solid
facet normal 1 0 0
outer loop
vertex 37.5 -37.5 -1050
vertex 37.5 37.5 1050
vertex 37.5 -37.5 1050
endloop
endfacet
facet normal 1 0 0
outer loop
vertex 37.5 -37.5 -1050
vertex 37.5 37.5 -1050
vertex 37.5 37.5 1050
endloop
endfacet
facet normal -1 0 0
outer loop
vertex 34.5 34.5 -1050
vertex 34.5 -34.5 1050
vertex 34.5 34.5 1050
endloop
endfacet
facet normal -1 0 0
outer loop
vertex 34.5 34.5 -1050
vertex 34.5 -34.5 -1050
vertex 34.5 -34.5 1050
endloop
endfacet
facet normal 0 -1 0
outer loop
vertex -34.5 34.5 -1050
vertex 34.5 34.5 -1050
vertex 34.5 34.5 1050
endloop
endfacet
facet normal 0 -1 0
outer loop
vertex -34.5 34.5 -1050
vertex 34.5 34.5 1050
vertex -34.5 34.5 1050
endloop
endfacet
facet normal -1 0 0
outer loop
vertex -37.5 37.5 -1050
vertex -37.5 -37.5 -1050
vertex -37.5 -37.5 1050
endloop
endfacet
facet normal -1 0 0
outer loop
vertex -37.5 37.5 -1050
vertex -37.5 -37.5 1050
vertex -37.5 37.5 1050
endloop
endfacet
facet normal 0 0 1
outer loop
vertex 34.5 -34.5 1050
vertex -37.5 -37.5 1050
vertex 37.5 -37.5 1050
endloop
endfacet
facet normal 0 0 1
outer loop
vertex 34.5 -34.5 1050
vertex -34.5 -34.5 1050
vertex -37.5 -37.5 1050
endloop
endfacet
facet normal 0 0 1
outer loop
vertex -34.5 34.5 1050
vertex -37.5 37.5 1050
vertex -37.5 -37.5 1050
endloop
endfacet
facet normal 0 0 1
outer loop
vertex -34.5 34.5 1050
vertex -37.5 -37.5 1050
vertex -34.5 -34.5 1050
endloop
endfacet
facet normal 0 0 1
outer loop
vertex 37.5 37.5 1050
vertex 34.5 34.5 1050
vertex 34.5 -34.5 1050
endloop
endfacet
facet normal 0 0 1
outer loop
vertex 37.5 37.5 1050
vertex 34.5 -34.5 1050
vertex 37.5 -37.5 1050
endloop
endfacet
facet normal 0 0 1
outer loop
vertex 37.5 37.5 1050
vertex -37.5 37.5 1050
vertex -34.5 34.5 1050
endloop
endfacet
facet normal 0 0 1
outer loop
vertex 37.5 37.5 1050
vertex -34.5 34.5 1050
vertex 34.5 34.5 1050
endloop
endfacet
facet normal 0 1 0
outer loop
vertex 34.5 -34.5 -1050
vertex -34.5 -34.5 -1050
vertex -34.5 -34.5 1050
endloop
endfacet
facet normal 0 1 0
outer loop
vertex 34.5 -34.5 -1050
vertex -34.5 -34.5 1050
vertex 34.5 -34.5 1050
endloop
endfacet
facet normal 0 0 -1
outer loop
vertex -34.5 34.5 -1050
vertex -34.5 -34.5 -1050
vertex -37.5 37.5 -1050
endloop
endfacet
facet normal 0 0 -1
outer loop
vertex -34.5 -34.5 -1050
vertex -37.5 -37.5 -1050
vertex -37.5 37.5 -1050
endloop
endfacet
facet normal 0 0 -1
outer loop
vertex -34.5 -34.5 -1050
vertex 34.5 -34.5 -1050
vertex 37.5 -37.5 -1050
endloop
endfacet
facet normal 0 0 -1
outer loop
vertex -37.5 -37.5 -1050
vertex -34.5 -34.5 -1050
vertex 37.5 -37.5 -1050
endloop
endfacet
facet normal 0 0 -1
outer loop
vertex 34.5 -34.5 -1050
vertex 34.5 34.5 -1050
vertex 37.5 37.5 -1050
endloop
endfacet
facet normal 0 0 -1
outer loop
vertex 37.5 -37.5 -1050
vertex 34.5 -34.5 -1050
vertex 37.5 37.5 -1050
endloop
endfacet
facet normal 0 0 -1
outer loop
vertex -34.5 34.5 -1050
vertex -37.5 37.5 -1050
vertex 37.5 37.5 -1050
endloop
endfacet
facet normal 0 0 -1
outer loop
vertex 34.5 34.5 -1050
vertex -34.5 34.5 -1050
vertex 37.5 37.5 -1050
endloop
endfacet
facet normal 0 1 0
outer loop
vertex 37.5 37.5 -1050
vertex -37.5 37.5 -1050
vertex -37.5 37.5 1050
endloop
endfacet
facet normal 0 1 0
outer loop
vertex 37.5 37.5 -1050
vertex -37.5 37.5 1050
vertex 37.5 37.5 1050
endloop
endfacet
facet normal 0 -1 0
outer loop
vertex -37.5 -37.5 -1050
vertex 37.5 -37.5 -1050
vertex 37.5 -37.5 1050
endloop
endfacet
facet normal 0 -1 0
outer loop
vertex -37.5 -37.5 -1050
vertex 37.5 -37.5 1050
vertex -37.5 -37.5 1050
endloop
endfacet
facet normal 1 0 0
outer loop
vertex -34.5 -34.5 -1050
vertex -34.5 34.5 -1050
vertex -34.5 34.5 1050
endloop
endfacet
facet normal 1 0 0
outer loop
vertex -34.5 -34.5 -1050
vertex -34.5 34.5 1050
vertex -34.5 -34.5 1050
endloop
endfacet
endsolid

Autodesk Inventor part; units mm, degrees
ref_plane "YZ Plane" through (0, 0, 0) normal (1, 0, 0) x (0, 1, 0)
ref_plane "XZ Plane" through (0, 0, 0) normal (0, 1, 0) x (-1, 0, 0)
ref_plane "XY Plane" through (0, 0, 0) normal (0, 0, 1) x (1, 0, 0)
sketch "Boceto1" plane through (0, 0, 0) normal (0, 0, 1) x (1, 0, 0)
  line L0 (-37.5, 37.5) -> (37.5, 37.5)
  line L1 (37.5, 37.5) -> (37.5, -37.5)
  line L2 (37.5, -37.5) -> (-37.5, -37.5)
  line L3 (-37.5, -37.5) -> (-37.5, 37.5)
  line L4 (34.5, 34.5) -> (-34.5, 34.5)
  line L5 (-34.5, 34.5) -> (-34.5, -34.5)
  line L6 (-34.5, -34.5) -> (34.5, -34.5)
  line L7 (34.5, -34.5) -> (34.5, 34.5)
  point P0 (0, 0)
  dimension "d0" = 75
  dimension "d1" = 75
  dimension "d2" = 3
  dimension "d3" = 37.5
  dimension "d4" = 37.5
extrude "Extrusión1" add sketch "Boceto1" along normal mid plane 2100
equation "\"d0\" = width"
equation "\"d1\" = height"
equation "\"d2\" = t"
equation "\"d3\" = 0.5 * height"
equation "\"d4\" = 0.5 * width"
equation "\"d5\" = length"
equation "\"width\" = 75"
equation "\"height\" = 75"
equation "\"t\" = 3"
equation "\"length\" = 2100"
properties part number "210 STEEL PROFILE" material "Acero"
